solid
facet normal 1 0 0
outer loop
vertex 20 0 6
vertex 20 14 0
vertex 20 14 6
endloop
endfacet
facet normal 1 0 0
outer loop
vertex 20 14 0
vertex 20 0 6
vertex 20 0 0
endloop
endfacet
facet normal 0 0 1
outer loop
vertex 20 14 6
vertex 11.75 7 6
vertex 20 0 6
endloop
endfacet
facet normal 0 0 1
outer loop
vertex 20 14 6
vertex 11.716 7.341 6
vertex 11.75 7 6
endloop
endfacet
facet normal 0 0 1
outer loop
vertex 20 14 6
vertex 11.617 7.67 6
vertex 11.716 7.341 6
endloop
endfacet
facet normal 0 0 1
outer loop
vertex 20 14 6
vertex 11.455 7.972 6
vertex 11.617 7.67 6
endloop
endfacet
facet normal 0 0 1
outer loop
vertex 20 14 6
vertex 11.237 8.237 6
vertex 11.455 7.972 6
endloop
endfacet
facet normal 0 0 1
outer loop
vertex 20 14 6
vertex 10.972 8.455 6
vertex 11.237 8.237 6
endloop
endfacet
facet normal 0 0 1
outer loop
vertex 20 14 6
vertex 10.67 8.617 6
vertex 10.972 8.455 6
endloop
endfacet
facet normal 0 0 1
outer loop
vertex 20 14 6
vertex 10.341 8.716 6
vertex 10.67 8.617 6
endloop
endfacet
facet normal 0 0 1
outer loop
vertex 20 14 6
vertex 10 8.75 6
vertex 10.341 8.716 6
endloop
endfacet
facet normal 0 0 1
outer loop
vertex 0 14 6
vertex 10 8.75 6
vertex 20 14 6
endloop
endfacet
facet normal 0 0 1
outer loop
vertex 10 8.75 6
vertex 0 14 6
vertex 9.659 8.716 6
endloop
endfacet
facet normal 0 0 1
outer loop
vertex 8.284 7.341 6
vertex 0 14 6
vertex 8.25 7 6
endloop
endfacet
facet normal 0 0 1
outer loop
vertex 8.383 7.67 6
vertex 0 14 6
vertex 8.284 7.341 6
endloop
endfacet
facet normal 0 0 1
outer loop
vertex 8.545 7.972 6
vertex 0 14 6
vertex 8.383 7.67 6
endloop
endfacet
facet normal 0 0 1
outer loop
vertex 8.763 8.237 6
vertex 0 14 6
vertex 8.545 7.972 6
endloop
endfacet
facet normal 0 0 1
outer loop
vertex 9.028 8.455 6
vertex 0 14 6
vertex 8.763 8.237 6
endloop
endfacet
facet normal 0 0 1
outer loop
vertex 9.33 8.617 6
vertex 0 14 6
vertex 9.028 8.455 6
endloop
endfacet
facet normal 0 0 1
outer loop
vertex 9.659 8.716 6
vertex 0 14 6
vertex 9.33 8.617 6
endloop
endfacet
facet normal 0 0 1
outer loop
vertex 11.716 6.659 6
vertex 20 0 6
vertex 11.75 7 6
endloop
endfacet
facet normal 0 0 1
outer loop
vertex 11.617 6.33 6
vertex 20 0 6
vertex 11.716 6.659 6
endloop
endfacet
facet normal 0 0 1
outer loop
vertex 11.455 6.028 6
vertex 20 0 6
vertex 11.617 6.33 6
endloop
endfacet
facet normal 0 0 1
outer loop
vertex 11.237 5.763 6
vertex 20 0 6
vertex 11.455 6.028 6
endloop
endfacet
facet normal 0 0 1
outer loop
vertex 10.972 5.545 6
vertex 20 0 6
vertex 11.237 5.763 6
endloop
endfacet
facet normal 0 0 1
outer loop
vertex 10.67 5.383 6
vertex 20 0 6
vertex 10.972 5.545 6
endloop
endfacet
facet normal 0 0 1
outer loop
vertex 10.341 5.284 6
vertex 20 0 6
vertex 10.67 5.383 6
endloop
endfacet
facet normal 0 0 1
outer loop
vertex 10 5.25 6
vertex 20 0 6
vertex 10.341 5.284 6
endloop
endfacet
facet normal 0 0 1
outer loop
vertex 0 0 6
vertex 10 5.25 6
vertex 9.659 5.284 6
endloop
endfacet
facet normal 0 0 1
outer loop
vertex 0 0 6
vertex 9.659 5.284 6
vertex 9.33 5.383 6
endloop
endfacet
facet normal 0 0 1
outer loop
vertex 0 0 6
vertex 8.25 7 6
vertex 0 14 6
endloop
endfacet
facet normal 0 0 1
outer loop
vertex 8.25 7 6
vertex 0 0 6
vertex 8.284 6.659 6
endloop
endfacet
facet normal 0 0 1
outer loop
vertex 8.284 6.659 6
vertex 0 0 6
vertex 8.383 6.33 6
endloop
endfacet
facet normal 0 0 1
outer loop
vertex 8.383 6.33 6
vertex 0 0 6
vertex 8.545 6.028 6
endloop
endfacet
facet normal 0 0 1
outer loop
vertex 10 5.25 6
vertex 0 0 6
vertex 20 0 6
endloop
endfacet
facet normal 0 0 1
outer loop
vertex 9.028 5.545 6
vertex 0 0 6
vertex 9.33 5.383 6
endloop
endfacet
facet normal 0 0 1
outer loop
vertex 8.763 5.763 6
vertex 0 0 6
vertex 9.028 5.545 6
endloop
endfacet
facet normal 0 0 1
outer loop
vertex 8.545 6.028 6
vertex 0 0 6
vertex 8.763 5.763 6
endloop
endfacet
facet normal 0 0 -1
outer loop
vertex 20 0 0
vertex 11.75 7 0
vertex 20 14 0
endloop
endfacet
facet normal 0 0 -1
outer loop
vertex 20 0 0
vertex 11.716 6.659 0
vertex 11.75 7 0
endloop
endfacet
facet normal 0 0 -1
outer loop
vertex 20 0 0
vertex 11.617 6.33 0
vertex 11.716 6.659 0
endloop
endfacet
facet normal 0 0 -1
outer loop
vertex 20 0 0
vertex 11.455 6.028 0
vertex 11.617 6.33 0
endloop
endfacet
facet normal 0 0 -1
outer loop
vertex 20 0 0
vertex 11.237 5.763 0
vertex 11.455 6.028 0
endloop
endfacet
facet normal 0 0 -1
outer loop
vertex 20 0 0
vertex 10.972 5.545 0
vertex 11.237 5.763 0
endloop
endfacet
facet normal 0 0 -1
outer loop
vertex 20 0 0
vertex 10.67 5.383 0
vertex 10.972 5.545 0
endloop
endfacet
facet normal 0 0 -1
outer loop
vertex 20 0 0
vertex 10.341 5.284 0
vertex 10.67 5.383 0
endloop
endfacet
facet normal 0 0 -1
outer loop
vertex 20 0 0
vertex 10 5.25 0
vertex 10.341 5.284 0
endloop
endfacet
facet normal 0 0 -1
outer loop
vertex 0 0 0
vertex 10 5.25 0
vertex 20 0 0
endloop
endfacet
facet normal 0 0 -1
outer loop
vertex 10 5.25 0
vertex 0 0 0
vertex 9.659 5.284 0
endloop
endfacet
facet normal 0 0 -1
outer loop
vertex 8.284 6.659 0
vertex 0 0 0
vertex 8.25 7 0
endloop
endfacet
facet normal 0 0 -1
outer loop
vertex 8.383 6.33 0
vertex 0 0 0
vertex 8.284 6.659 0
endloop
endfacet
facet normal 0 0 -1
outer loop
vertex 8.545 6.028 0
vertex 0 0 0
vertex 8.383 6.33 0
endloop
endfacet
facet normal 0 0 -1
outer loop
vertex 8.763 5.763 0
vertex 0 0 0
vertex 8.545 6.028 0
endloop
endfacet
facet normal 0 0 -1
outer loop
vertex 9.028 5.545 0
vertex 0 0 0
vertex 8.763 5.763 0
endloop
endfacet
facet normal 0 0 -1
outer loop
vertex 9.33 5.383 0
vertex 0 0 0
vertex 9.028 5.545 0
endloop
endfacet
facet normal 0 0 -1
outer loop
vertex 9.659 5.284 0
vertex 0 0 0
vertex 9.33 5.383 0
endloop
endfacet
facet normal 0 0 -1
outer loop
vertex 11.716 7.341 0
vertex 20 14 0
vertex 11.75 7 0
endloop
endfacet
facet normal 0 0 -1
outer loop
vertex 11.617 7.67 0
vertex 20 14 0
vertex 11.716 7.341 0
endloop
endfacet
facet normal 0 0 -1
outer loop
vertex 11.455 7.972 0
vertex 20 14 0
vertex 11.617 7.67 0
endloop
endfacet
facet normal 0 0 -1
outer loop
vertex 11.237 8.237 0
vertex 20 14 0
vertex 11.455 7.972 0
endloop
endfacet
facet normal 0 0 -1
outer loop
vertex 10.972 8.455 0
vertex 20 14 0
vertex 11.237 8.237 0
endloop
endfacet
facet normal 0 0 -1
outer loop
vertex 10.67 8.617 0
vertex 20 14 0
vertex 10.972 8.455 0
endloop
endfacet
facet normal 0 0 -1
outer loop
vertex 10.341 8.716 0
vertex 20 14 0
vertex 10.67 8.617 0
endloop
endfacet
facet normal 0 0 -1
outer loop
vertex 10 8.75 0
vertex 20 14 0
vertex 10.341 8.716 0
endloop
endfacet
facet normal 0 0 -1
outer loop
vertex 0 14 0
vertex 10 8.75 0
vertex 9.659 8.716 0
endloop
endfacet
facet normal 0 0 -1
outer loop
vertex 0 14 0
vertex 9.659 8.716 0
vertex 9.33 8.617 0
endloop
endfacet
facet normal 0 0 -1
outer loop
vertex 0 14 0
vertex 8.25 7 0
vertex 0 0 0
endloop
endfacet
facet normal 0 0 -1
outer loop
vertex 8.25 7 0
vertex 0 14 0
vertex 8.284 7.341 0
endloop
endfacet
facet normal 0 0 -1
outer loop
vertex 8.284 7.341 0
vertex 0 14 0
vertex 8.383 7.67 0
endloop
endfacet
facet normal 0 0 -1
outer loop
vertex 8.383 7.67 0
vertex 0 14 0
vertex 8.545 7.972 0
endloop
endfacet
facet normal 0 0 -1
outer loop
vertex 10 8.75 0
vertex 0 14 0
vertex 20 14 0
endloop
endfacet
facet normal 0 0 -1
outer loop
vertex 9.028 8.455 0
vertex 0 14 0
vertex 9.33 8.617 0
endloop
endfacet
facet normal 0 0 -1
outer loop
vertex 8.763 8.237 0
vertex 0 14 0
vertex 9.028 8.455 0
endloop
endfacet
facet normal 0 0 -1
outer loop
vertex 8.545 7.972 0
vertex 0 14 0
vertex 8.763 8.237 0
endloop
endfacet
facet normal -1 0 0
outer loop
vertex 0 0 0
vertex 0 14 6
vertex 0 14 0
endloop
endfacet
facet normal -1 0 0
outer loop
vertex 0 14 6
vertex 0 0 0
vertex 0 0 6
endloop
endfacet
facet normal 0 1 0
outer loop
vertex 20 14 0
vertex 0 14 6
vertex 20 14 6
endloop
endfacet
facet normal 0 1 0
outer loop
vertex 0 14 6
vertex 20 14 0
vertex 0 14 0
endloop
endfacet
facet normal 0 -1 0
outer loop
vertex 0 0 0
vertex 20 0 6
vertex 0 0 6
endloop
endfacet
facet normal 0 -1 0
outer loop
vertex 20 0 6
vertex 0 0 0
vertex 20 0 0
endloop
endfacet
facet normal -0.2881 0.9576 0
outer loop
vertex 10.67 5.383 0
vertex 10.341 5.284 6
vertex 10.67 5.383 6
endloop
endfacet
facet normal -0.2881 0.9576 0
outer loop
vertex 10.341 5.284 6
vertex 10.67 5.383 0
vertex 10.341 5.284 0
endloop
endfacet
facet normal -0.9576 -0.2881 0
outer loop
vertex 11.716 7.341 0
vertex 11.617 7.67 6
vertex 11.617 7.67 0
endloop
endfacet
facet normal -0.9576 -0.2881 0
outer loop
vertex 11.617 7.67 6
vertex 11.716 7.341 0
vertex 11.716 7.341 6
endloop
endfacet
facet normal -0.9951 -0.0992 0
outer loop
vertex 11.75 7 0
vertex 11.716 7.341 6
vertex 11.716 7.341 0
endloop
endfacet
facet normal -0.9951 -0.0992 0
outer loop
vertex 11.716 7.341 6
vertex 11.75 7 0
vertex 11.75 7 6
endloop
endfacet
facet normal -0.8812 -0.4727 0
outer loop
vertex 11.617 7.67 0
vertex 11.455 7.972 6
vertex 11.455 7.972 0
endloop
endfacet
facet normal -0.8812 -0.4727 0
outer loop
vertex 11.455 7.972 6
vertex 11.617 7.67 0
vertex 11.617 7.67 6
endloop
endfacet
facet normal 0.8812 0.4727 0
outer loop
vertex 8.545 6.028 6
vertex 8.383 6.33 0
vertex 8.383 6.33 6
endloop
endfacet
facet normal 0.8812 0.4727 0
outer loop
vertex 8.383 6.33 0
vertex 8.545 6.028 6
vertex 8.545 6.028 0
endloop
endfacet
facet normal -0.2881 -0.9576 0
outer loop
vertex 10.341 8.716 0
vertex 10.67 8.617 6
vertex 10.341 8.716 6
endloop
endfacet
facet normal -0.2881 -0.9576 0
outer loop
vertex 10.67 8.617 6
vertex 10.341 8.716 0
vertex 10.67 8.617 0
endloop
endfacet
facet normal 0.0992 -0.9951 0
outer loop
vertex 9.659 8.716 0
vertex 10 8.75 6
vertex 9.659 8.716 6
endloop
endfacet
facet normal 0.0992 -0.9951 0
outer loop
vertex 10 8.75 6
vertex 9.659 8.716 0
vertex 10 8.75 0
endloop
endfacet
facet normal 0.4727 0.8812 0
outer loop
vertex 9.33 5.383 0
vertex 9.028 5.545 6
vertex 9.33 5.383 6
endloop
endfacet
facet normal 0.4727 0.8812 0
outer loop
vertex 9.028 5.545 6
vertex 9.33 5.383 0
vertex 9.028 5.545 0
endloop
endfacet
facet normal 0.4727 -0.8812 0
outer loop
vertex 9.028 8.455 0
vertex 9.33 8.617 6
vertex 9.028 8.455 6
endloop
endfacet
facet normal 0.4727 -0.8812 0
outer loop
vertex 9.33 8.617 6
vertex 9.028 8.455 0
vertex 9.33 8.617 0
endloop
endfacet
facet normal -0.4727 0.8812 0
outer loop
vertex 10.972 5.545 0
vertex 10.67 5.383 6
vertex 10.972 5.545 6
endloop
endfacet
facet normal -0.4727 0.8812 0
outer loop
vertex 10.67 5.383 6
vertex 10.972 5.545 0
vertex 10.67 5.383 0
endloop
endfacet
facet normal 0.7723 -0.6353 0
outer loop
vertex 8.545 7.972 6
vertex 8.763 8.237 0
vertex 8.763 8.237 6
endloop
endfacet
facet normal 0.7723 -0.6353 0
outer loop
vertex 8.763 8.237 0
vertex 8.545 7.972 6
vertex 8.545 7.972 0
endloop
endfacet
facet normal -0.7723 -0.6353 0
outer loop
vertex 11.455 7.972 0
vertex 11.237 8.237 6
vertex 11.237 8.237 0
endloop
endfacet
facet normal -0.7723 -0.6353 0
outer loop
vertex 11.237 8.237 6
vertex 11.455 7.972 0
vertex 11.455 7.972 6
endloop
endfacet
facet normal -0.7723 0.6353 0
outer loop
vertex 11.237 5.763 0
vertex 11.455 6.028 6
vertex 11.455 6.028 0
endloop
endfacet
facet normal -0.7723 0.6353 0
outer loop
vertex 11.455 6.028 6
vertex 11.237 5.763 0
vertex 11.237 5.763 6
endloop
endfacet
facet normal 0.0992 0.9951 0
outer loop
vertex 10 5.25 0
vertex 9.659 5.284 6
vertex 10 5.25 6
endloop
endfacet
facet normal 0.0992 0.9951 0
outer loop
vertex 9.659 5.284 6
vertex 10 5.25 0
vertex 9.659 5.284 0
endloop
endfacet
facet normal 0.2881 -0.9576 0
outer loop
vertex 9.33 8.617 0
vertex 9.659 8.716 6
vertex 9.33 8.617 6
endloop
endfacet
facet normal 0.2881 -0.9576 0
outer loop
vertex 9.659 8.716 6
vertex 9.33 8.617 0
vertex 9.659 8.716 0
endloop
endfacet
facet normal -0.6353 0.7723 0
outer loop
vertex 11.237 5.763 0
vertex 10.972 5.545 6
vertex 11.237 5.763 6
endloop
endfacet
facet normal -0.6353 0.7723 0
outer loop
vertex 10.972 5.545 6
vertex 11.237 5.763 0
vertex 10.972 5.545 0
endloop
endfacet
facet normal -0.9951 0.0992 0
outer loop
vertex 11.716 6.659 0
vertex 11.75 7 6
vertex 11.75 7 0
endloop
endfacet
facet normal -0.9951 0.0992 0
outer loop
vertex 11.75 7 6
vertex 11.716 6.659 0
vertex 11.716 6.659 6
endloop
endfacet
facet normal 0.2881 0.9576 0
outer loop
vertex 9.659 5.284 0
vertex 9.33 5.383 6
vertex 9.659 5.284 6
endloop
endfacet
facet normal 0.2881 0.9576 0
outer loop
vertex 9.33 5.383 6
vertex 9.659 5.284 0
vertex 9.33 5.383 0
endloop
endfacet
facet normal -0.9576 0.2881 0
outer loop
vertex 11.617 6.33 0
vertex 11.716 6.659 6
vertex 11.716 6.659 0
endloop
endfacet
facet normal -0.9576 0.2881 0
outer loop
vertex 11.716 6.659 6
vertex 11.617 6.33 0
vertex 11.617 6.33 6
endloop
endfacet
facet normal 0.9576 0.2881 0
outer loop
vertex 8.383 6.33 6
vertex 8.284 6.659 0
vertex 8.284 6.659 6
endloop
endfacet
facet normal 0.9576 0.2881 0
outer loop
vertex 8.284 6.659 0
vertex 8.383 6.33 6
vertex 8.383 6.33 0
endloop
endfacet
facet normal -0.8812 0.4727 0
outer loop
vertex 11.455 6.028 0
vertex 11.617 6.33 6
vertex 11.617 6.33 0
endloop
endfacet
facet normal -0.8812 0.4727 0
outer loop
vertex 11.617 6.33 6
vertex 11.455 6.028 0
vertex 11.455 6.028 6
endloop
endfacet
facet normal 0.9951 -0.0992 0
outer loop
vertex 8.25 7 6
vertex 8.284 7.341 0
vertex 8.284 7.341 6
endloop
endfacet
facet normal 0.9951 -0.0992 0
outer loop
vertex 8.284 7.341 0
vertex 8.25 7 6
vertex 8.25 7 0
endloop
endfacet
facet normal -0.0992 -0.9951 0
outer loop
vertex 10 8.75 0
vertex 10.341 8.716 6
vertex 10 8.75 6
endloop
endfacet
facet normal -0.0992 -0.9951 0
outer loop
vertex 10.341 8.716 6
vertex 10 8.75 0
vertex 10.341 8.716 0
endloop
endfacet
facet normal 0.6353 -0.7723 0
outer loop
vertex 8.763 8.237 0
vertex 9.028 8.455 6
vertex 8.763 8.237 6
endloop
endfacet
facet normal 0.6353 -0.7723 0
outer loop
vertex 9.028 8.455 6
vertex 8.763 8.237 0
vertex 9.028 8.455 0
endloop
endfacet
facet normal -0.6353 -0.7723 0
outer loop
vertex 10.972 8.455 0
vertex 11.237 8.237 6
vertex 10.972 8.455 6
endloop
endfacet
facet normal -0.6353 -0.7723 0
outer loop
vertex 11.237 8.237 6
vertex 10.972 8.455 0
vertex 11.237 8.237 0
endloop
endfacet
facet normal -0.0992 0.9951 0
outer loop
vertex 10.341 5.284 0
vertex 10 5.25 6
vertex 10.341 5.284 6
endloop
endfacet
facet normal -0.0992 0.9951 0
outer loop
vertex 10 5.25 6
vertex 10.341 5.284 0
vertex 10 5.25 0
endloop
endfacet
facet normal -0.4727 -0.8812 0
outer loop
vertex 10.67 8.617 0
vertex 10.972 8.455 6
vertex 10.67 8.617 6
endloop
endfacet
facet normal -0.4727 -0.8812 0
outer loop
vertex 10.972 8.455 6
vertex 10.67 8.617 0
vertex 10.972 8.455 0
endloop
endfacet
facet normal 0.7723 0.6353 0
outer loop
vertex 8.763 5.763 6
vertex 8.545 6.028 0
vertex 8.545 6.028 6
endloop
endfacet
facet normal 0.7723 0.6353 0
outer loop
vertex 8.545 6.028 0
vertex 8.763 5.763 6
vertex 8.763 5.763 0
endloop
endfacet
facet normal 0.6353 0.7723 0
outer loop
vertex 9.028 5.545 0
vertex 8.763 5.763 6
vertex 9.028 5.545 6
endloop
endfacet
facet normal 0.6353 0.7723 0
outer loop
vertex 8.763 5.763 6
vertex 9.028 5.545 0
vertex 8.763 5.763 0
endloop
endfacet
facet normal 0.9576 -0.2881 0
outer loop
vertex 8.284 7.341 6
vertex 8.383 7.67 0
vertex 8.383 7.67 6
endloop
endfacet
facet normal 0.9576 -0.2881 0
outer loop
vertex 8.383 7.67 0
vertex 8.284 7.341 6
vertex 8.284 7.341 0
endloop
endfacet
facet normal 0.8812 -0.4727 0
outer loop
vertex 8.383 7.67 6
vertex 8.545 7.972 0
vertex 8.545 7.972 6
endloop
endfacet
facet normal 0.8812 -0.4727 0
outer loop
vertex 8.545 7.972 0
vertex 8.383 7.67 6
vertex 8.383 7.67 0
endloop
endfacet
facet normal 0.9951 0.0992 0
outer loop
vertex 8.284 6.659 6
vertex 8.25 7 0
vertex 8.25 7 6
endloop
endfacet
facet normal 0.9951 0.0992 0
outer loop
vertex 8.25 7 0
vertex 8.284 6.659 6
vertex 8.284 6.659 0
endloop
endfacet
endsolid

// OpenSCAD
$fn = 32;

// ----------------------------------------------------------------------
// Micro pad: drilled pad, 5-20 mm class
// ----------------------------------------------------------------------

// --- parameters (mm) ---
pad_l = 20;               // pad length, X
pad_w = 14;               // pad width, Y
pad_t = 6;                // pad thickness, Z
hole_d = 3.5;             // through hole diameter
fit_tol = 0.1;            // tolerance for press fits, mm
free_tol = 0.5;           // tolerance for clearance fits, mm

difference() {
  cube([pad_l, pad_w, pad_t]);
  translate([pad_l / 2, pad_w / 2, -1])
    cylinder(h = pad_t + 2, d = hole_d);
}
